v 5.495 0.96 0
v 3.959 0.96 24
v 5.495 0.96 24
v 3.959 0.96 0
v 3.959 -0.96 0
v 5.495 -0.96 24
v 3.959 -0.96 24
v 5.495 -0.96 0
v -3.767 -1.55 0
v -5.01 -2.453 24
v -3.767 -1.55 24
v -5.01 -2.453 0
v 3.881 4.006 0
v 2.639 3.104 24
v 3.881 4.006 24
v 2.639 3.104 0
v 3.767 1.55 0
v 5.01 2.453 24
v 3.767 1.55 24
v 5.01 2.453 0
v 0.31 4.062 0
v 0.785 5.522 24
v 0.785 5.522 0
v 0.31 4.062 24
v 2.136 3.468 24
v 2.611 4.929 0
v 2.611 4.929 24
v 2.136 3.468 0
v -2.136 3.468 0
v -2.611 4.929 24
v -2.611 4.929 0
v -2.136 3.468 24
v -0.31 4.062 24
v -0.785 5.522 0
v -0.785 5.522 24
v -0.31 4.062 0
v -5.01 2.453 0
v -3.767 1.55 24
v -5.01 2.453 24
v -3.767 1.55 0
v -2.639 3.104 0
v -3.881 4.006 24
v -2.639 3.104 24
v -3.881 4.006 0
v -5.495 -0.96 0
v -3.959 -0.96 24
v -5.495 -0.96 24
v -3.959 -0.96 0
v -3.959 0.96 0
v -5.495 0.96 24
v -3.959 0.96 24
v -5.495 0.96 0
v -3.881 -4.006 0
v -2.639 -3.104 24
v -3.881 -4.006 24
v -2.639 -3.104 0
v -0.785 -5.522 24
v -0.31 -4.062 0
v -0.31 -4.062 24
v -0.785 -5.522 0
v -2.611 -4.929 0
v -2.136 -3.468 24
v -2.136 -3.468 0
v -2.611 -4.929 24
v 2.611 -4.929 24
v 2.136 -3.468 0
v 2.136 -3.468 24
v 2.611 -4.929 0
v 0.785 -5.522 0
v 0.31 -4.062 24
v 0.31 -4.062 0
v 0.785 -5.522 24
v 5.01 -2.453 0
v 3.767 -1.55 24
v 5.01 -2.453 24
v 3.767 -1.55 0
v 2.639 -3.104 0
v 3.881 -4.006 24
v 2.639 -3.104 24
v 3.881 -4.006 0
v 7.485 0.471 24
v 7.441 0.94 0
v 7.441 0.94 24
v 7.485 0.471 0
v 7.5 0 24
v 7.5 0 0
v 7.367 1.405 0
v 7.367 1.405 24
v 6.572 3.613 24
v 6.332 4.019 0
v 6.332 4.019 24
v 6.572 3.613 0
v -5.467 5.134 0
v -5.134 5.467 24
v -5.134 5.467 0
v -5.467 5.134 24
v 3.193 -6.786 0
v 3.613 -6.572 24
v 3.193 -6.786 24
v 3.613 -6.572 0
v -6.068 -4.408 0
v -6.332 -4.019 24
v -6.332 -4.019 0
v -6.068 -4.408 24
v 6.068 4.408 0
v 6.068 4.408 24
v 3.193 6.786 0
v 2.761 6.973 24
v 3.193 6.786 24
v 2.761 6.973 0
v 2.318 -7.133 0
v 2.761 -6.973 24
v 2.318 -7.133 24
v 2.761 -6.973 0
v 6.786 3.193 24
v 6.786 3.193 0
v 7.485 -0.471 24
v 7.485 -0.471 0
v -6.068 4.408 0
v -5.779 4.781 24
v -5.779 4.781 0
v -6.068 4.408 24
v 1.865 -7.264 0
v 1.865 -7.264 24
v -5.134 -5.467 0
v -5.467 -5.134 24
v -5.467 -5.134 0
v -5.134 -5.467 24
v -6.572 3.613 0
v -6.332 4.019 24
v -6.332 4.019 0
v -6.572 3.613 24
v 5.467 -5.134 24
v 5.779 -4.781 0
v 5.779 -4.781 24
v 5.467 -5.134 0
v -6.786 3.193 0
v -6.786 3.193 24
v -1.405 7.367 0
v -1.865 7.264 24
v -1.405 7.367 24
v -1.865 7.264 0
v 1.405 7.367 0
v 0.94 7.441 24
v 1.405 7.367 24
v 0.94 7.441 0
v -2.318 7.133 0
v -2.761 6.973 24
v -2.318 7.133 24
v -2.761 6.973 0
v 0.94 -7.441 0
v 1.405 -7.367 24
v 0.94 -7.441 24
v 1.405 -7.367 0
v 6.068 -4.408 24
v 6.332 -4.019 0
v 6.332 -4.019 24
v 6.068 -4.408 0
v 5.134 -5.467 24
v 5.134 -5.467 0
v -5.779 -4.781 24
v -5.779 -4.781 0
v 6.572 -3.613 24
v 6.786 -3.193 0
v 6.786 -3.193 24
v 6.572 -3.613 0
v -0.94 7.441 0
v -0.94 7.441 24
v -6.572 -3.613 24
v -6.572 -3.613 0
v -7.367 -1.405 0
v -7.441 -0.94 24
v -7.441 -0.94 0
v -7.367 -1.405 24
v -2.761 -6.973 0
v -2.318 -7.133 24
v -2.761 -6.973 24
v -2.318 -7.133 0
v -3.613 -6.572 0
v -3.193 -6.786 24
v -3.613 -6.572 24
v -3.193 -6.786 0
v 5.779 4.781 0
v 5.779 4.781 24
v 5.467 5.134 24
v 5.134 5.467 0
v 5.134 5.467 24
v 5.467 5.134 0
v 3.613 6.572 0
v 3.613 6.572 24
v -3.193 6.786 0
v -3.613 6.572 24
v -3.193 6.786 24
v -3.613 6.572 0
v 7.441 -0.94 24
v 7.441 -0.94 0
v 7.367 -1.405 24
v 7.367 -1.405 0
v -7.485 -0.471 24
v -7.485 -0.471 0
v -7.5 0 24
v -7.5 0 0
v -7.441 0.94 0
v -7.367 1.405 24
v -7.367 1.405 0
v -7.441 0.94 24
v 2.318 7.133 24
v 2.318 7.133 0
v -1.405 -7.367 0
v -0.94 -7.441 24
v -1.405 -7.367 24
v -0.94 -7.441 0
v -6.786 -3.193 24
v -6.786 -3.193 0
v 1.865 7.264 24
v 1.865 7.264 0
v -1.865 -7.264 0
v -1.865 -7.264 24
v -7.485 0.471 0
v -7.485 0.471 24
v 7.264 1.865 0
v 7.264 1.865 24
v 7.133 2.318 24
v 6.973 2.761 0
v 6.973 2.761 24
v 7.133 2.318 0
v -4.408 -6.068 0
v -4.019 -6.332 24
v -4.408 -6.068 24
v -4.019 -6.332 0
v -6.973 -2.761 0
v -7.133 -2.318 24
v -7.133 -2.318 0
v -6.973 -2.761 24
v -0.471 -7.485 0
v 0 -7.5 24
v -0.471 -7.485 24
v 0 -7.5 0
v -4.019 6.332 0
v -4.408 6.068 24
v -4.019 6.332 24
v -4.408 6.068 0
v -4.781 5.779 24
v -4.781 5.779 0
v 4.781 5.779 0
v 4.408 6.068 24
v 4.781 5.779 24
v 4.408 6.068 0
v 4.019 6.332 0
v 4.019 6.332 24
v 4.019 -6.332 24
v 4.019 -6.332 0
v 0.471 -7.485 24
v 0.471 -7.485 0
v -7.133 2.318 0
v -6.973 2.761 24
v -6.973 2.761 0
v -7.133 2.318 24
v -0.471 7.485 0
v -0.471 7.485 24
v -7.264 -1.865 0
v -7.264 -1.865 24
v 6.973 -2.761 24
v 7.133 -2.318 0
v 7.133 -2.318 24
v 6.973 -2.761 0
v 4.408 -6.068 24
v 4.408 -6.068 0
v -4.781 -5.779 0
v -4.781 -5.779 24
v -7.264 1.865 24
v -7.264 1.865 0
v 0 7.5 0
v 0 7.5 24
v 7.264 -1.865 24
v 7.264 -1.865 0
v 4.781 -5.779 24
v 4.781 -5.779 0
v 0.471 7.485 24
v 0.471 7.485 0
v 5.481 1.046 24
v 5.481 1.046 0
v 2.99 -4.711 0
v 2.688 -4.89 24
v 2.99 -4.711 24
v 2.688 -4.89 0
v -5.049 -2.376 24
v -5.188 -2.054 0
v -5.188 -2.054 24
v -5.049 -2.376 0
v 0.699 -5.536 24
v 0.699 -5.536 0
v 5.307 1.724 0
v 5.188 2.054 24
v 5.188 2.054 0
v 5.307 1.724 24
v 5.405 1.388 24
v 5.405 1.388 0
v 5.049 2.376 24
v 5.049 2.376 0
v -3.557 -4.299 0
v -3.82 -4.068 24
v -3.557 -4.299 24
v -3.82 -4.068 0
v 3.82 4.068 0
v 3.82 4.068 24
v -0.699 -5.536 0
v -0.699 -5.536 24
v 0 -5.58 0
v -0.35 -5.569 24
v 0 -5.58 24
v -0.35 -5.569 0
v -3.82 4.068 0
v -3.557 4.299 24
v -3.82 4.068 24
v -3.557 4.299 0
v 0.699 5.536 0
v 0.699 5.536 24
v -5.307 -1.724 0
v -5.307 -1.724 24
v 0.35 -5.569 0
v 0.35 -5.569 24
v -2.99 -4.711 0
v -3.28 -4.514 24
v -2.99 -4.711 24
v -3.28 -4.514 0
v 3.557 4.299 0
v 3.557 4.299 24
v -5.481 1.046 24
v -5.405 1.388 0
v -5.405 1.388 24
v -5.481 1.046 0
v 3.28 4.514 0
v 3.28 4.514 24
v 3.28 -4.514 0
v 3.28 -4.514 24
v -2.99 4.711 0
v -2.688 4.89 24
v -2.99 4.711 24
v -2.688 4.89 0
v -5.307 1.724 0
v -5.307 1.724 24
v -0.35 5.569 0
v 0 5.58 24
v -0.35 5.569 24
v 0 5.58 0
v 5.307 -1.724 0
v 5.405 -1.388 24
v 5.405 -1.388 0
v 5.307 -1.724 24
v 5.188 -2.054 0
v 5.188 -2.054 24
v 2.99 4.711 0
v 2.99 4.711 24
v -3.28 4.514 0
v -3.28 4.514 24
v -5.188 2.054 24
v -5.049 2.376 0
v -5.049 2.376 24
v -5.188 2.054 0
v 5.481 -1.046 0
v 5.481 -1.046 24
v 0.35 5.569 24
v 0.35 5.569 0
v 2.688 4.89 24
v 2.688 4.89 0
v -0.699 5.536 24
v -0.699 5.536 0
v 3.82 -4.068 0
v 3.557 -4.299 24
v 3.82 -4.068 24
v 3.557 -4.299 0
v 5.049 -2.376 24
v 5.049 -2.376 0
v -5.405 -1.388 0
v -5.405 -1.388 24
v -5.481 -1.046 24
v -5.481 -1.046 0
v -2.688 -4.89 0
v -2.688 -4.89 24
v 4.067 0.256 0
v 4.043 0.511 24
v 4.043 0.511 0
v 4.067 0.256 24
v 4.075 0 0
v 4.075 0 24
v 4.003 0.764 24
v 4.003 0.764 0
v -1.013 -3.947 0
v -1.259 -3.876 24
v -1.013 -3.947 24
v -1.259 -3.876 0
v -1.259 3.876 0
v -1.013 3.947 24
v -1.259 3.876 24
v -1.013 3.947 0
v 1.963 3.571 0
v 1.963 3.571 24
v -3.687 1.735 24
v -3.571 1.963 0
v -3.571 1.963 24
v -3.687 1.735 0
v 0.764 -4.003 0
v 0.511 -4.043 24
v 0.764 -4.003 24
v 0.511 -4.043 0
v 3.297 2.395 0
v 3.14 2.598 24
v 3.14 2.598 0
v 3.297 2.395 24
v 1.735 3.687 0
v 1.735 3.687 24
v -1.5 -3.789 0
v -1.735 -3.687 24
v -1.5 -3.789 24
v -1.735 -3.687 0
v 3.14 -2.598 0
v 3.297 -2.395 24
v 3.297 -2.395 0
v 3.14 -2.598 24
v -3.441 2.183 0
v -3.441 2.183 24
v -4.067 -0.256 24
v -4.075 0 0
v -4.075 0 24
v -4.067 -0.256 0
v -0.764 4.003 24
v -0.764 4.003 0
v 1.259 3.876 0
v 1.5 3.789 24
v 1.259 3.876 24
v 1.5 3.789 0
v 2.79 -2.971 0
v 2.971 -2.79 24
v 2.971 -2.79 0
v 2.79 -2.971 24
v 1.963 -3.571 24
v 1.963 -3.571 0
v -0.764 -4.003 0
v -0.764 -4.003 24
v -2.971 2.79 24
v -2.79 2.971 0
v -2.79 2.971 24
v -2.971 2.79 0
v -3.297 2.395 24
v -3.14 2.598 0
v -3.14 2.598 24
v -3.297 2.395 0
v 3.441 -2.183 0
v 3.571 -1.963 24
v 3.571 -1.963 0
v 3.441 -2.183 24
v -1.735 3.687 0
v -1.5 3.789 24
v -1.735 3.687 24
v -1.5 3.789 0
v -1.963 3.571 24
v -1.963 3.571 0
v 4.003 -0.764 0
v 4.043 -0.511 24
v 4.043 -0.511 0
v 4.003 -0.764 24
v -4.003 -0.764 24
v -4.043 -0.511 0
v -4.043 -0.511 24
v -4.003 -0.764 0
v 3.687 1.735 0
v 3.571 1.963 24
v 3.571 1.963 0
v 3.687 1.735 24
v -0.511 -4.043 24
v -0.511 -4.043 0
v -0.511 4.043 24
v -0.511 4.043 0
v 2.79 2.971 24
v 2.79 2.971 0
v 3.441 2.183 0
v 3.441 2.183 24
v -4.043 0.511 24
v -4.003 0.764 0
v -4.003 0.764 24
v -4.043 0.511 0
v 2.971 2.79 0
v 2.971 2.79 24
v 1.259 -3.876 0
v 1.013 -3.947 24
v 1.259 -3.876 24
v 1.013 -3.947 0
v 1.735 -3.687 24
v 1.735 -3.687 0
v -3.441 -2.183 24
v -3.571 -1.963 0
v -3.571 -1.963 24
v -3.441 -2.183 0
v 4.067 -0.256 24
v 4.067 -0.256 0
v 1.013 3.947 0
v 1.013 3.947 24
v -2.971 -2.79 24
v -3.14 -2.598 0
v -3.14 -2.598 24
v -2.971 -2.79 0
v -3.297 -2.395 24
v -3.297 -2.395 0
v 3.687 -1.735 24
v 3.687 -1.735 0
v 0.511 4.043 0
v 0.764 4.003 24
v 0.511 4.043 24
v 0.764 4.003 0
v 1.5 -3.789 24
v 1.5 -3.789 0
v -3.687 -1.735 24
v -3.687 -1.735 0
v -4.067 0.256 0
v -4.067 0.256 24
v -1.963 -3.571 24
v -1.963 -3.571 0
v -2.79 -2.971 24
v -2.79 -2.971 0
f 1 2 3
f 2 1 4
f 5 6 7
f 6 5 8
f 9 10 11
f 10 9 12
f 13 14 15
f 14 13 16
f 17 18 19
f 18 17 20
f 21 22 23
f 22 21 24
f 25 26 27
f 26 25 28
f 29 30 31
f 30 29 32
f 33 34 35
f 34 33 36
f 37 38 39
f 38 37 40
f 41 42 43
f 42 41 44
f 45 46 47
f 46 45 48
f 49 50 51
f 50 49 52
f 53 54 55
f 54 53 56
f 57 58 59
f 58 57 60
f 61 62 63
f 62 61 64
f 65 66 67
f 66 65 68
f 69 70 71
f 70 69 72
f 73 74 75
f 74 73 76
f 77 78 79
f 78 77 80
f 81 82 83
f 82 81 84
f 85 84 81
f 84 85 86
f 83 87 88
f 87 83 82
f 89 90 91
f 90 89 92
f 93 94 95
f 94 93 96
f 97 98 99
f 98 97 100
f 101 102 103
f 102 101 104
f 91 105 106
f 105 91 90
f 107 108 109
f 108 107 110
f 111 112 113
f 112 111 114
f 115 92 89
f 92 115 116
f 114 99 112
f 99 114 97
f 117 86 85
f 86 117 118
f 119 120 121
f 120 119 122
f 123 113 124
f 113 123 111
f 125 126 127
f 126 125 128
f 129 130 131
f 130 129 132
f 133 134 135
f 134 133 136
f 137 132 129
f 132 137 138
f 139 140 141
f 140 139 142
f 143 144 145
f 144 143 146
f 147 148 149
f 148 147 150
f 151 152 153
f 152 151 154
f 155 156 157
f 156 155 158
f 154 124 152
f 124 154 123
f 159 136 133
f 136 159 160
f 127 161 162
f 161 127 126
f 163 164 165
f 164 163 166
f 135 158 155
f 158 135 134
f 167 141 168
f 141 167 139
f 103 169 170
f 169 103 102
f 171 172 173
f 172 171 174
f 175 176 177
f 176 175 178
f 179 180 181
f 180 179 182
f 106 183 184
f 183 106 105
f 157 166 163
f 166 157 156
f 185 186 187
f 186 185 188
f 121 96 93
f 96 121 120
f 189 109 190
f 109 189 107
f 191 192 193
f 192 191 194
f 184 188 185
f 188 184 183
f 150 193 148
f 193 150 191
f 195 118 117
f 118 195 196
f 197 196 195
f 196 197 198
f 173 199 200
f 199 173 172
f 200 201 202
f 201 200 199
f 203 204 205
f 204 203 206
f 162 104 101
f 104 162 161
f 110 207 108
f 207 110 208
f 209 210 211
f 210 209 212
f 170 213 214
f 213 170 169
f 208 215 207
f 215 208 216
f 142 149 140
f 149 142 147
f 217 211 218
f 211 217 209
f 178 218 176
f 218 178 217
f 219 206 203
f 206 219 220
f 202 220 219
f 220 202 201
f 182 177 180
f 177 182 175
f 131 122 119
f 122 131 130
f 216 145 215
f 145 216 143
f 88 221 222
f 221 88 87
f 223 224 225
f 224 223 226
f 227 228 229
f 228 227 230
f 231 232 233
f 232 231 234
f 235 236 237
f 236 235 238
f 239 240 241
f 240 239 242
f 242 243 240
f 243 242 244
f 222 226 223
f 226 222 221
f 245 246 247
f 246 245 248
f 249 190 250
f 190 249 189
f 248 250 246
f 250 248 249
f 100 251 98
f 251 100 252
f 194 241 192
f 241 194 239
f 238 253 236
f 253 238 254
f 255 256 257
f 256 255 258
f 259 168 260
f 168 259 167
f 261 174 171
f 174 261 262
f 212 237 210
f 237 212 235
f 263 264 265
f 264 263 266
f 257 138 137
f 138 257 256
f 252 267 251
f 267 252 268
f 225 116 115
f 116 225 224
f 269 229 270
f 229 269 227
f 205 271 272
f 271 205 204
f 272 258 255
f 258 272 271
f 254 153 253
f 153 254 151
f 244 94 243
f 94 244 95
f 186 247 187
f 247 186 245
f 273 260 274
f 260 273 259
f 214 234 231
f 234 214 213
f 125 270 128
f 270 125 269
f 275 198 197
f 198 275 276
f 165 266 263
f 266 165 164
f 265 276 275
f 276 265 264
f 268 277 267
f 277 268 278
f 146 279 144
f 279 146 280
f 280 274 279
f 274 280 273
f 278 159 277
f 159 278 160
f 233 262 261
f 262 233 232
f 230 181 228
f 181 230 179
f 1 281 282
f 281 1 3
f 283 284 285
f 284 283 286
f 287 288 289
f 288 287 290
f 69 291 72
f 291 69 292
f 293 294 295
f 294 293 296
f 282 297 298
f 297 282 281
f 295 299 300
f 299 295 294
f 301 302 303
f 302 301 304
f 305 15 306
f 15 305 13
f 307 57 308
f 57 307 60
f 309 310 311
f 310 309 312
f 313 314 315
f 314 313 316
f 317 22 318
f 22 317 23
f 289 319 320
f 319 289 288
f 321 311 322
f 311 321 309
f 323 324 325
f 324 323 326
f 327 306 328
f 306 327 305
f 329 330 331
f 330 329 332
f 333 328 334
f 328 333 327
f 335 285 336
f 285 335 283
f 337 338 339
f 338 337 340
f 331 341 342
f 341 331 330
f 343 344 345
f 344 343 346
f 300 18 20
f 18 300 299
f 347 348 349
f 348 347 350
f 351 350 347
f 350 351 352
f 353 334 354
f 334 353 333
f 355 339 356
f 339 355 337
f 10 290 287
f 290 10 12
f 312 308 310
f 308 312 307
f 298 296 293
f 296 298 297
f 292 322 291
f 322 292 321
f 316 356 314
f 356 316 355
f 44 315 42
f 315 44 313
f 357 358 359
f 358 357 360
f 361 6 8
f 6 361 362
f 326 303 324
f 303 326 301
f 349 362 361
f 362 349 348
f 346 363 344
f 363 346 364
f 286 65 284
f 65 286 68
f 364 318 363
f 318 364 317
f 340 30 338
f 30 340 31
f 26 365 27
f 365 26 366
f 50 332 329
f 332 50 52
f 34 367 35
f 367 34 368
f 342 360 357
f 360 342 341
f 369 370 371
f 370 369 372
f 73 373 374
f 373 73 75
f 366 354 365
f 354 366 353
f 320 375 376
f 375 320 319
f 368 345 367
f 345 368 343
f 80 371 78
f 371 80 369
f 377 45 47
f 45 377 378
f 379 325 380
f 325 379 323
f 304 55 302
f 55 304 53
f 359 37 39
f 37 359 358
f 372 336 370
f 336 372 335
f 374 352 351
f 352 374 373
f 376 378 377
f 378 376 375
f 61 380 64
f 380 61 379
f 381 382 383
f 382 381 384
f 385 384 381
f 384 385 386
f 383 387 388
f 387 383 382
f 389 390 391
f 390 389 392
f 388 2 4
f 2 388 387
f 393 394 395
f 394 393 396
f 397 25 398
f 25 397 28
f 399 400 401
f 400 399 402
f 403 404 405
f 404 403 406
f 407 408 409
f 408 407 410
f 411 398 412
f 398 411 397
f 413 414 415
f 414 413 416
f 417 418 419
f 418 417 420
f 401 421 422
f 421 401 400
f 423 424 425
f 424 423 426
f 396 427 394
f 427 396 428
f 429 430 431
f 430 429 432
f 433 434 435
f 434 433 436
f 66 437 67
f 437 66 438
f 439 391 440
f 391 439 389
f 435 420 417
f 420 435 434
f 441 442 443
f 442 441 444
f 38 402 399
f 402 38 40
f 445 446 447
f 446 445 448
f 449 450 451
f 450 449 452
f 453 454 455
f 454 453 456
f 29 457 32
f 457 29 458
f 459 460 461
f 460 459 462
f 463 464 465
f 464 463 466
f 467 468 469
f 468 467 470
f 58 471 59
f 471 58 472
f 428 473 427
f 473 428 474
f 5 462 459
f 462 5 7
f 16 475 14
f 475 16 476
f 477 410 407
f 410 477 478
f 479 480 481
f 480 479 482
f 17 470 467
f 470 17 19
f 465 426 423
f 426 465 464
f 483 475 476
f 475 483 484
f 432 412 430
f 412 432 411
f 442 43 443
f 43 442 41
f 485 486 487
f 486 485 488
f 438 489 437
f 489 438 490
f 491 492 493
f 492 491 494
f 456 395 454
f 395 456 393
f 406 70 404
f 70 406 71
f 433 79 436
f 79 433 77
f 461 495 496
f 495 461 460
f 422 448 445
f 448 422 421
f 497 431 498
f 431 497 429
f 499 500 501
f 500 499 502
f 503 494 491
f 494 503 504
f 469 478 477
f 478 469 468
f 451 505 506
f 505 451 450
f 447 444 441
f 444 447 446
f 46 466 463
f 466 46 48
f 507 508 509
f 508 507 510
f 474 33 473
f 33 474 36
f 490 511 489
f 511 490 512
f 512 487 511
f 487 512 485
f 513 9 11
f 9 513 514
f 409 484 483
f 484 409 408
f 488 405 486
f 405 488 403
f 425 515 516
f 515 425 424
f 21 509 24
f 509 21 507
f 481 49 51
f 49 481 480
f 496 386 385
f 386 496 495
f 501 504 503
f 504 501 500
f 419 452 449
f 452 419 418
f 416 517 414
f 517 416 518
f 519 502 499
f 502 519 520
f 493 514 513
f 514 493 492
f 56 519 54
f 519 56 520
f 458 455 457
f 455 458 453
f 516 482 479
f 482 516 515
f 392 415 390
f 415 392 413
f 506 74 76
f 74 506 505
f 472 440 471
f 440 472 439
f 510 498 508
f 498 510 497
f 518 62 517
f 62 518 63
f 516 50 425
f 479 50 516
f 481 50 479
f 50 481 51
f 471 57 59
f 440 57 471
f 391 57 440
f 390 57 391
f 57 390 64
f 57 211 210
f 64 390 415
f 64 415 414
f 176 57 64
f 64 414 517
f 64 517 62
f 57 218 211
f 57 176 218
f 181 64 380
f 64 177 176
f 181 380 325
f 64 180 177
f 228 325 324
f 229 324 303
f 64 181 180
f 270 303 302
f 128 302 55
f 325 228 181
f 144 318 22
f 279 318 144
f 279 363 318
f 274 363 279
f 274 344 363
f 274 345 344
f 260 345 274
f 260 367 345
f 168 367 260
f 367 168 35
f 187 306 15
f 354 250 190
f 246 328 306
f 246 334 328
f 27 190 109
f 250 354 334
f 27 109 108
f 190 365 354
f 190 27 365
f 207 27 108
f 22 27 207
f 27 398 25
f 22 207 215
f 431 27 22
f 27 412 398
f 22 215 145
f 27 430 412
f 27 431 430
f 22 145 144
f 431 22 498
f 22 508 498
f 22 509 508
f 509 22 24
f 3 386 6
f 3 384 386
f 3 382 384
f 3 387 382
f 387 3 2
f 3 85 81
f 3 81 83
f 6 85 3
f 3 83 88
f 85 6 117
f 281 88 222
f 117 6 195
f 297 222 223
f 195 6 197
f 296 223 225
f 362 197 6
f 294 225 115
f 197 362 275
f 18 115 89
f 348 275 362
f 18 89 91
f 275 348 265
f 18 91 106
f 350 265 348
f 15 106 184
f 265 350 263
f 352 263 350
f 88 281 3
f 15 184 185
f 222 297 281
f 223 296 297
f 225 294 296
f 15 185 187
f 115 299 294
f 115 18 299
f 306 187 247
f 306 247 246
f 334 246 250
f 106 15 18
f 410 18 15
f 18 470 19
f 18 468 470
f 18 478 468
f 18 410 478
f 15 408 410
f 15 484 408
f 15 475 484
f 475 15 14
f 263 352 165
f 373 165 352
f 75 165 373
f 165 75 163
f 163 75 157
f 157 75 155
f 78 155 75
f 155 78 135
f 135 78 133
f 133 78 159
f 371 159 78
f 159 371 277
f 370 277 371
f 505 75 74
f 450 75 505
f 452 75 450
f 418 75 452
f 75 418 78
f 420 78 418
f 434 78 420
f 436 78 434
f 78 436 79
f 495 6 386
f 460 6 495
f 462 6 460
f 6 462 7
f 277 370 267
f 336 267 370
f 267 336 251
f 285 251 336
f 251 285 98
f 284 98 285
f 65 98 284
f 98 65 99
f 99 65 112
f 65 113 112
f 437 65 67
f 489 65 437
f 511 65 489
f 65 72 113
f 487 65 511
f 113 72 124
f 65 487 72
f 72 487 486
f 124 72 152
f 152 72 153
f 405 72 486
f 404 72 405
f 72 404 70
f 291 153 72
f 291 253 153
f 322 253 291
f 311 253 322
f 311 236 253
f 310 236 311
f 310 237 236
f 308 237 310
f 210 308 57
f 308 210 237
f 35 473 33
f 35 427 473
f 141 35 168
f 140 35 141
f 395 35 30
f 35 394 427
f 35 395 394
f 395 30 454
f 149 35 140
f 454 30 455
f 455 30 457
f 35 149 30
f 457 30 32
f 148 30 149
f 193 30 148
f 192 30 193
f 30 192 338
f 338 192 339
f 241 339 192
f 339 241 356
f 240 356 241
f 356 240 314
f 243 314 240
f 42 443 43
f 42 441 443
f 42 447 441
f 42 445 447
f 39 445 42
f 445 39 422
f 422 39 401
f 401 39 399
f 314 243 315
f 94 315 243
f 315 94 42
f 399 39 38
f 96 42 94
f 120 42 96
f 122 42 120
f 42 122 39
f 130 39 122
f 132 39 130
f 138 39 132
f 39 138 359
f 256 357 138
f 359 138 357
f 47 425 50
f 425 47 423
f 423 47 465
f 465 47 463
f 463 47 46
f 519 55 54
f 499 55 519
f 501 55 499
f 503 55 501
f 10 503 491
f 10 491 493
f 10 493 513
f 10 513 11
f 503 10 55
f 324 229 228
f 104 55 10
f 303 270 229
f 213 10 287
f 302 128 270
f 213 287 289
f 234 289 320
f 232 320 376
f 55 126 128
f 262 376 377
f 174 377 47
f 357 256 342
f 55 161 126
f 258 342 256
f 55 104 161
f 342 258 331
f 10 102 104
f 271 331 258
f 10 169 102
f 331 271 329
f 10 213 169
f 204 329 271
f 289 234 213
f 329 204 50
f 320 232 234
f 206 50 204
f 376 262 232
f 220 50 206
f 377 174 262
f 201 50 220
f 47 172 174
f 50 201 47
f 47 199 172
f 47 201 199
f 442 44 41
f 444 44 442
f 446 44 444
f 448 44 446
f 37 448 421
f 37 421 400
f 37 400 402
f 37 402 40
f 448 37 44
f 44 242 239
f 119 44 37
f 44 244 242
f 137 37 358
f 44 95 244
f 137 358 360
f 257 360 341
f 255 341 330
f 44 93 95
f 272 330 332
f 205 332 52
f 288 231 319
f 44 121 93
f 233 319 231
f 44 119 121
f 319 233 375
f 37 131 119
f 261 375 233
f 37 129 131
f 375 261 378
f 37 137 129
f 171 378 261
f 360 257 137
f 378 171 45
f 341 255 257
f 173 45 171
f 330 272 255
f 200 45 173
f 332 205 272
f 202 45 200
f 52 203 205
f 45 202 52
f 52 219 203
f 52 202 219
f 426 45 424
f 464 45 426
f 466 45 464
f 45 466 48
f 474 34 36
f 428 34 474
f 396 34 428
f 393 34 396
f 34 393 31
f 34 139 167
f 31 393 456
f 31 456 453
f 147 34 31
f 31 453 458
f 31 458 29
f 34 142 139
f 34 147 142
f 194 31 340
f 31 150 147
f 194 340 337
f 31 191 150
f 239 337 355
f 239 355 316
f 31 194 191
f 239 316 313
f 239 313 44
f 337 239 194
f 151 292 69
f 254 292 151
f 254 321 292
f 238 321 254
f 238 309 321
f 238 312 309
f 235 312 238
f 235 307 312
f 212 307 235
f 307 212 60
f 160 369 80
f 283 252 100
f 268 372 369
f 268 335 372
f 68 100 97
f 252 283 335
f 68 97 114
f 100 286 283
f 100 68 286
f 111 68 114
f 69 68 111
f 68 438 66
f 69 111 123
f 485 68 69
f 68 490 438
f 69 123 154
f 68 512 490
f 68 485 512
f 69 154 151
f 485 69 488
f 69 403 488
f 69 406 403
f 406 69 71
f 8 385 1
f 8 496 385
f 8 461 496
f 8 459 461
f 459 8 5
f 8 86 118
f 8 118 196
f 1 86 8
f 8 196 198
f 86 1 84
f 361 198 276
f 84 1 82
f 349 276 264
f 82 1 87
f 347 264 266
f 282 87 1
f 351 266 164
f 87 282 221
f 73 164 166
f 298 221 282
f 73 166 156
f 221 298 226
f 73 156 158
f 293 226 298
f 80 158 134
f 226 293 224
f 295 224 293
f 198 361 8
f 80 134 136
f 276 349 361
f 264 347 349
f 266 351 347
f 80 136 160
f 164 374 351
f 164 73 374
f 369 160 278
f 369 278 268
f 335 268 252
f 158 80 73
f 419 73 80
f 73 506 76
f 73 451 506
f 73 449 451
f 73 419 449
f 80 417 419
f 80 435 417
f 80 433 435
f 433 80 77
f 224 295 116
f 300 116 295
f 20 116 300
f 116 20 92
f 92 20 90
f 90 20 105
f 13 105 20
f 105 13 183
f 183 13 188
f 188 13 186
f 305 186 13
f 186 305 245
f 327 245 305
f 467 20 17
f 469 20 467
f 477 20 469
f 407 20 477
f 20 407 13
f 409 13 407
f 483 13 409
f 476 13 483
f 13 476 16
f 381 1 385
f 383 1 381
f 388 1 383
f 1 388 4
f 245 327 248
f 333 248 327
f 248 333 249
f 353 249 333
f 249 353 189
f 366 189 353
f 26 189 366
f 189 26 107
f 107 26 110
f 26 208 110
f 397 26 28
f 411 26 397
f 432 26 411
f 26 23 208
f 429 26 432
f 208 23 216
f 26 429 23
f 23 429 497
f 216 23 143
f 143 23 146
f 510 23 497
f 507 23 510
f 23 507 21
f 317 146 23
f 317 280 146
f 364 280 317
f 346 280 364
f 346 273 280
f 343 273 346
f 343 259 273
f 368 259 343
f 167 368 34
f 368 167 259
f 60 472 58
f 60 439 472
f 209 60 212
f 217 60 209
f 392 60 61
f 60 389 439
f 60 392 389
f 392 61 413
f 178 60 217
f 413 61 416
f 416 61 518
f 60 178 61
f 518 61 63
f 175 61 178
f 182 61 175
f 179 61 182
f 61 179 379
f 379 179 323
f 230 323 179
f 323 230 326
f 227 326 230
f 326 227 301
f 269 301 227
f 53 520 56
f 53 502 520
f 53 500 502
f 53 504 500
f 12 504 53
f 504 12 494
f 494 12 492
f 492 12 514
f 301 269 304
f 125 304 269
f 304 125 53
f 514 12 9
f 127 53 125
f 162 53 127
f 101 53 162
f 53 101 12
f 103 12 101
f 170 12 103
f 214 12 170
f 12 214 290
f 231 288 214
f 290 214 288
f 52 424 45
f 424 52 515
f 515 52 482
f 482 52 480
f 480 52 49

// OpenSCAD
 /*
 * Customizable Linear Bushing - https://www.thingiverse.com/thing:2202854
 * by Dennis Hofmann - https://www.thingiverse.com/mightynozzle/about
 * created 2017-03-25
 * updated 2018-02-15
 * version v1.8
 *
 * Changelog
 * --------------
 * v1.8:
 *      - groove option added
 * v1.7:
 *      - fixed inner diameter
 * v1.6:
 *      - added chamfer angle option
 * v1.5:
 *      - fixed graphic glitch
 * v1.4:
 *      - added chamfer option
 *
 * v1.1-1.3:
 *      - initial model with minor changes in description
 *
 * --------------
 * 
 * This work is licensed under the Creative Commons - Attribution - Non-Commercial license.
 * https://creativecommons.org/licenses/by-nc/3.0/
 */
 
 // Parameter Section //
//-------------------//

/* [Bushing Settings] */

// Equals dr in technical diagrams. Use the outer diameter of the rod + tolerance value of your printer. Do some test prints before print a whole set of bushings. Best way in my case is to choose the bushing where can push it in with some effort on the rod and slide it by hand without any tools. Then slide it back and forth along the rod, until the bushing has the expected behavior. I suggest you not to use any drill or heat. The sliding of the bushing generates enough heat from its friction against the rod. Standard values: 6.00 for LM6(L)UU, 8.00 (default 8.15) for LM8(L)UU, 10.00 for LM10(L)UU, 12.00 for LM12(L)UU, 16.00 for LM16UU, ...
inner_diameter_in_millimeter = 8.15;

// Equals D in technical diagrams. Use the inner diameter of housing where the bushing sits + tolerance value of your printer. Depends on the filament you use and the total wall thickness of the bushings, the bushing shouldn't fit to tight in the housing. Standard values: 12.0 for LM6(L)UU, 15.0 (default) for LM8(L)UU, 19.0 for LM10(L)UU, 21.0 for LM12(L)UU, 28.0 for LM16UU, ...
outer_diameter_in_millimeter = 15.0; 

// Equals L in technical diagrams. Standard values: 19.0 for LM6UU, 24.0 for LM8UU, 29.0 for LM10UU, 30.0 for LM12UU, 35.0 for LM6LUU, 37.0 for LM16UU, 45.0 for LM8LUU, 55.0 for LM10LUU, 57.0 for LM12LUU, ...
bushing_length_in_millimeter = 24.0;

// Use a value to get straight primeters without any zigzag between the outer and inner perimeter. I use the value of 0.48 for 0.4 nozzle. This is the auto extrusion width of 0.48 of simplify3d. More information about this in the description of this design on thingiverse.
extrusion_width_in_millimeter = 0.48; 

// Use even numbers. E.g. 4 for LM8(L)UU. Don't forget to set the perimeter number in your Slicer! 
number_of_perimeters = 4; //[2:2:10]

// Choose a number to provide a gap between the teeth in the bushing. E.g. 8 or 10 for LM8(L)UU. The tooth width depends on the extrusion_width_in_millimeter and the number_of_perimeters.
number_of_teeth = 10; //[3:20]

// Radius of the chamfer. Set a chamfer if you want to insert the rod easier. This also helps if your prints tends to create elephant foot in the first few layers. A value between 0.3 and 1.0 might be a good value. Set a value above 0 might destroy the preview of the bushing. But the resulting stl-File will be correct.
chamfer_radius_in_millimeter = 0.0;

// Set the angle of the chamfer. 
chamfer_angle_in_degree = 55.0; // [30:75]

// Equals W in technical diagram. 1.1 for LM6/8(L)UU, 1.3 for LM10/12/13(L)UU, 1.6 for LM16/20(L)UU, 1.85 for LM25/30(L)UU, 2.1 for LM35/40(L)UU, 2.6 for LM50(L)UU, 3.15 for LM60(L)UU
groove_length_in_millimeter = 0;

// Equals D1 in technical diagram. 11.5 for LM6(L)UU, 14.3 for LM8(L)UU, 18.0 for LM10(L)UU, 20.0 for LM12(L)UU, 22.0 for LM13(L)UU, 27.0 for LM16(L)UU, 30.5 for LM20(L)UU, 38.0 for LM25(L)UU, 43.0 for LM30(L)UU, 49.0 for LM35(L)UU, 57.0 for LM40(L)UU, 76.5 for LM50(L)UU, 86.5 for LM60(L)UU
groove_diameter_in_millimeter = 0;

// Equals B in technical diagram. Outer distance between both grooves. 13.5 for LM6UU, 17.5 for LM8UU, 22.0 for LM10UU, 23.0 for LM12UU, 26.5 for LM16UU, 27.0 for LM6LUU, 35.0 for LM8UU, 44.0 for LM10LUU, 46.0 for LM12LUU, 53.0 for LM16LUU
groove_distance_in_millimeter = 0;

/* [Hidden] */
inner_dia = inner_diameter_in_millimeter;
outer_dia = outer_diameter_in_millimeter;
bushing_l = bushing_length_in_millimeter;
extrusion_w = extrusion_width_in_millimeter;
perimeters = number_of_perimeters;
teeth = number_of_teeth;
chamfer_r = chamfer_radius_in_millimeter;
chamfer_h = tan(chamfer_angle_in_degree) * chamfer_r;
groove_l = groove_length_in_millimeter;
groove_dia = groove_diameter_in_millimeter;
groove_d = groove_distance_in_millimeter;


$fn=100;

 // Program Section //
//-----------------//

color("HotPink") difference() {
    bushing();
    if(chamfer_r > 0) {
        chamfer_cut();
        translate([0, 0, bushing_l]) {
            rotate([180,0,0]) {
                chamfer_cut();
            }
        }
    }
    groove_cut();
}


 // Module Section //
//----------------//

module bushing() {
    translate([0, 0, bushing_l / 2]) {
        difference() {
            union() {
                difference() {
                    for(tooth = [0 : teeth - 1])
                        rotate([0, 0, 360 / teeth * tooth]) {
                            translate([outer_dia / 4, 0, 0]) {
                                cube([outer_dia / 2, extrusion_w * perimeters, bushing_l + 1], center = true);
                            }
                        }
                        translate([0, 0, -bushing_l / 2-1]) {
                            ring(outer_dia * 2, outer_dia, bushing_l + 2);
                        }
                    }
                    translate([0, 0, -bushing_l / 2 - 1]) {
                        ring(outer_dia, outer_dia - extrusion_w * perimeters * 2, bushing_l + 2);
                    }
            }
            cylinder(d = inner_dia, h = bushing_l + 2, center = true);
            translate([0, 0, bushing_l / 2]) {
                cylinder(d = outer_dia + 1, h = 2, $f = 16);
            }
            translate([0, 0, -(bushing_l / 2 + 2)]) {
                cylinder(d = outer_dia + 1, h = 2, $f = 16);
            }
        }
    }
}

module ring(d1, d2, height) {
    difference() {
        cylinder(d = d1, h = height, center = false);
        cylinder(d = d2, h = height, center = false);
    }
}

module chamfer_cut() {
    union() {
        difference() {
            translate([0, 0, -1]) {
                cylinder(d = outer_dia + 1, h = chamfer_h + 1);
            }
            intersection() {
                cylinder(d = outer_dia, h = chamfer_h);
                cylinder(d1 = outer_dia - chamfer_r * 2, d2 = outer_dia, h = chamfer_h);
            }
        }
        translate([0, 0, -chamfer_h]) {
            intersection() {
                cylinder(d = inner_dia + chamfer_r * 4, h = chamfer_h * 2);
                cylinder(d1 = inner_dia + chamfer_r * 4, d2 = inner_dia, h = chamfer_h * 2);
            }
        }
        translate([0, 0, -10]) {
            cylinder(d = outer_dia + 1, h = 10);
        }
    }
}

module groove_cut() {
    translate([0, 0, bushing_l / 2 - groove_d / 2]) {
        ring(outer_dia + 1, groove_dia, groove_l);
    }
    translate([0, 0, bushing_l - ((bushing_l / 2) - (groove_d / 2) + groove_l)]) {
        ring(outer_dia + 1, groove_dia, groove_l);
    }
}
